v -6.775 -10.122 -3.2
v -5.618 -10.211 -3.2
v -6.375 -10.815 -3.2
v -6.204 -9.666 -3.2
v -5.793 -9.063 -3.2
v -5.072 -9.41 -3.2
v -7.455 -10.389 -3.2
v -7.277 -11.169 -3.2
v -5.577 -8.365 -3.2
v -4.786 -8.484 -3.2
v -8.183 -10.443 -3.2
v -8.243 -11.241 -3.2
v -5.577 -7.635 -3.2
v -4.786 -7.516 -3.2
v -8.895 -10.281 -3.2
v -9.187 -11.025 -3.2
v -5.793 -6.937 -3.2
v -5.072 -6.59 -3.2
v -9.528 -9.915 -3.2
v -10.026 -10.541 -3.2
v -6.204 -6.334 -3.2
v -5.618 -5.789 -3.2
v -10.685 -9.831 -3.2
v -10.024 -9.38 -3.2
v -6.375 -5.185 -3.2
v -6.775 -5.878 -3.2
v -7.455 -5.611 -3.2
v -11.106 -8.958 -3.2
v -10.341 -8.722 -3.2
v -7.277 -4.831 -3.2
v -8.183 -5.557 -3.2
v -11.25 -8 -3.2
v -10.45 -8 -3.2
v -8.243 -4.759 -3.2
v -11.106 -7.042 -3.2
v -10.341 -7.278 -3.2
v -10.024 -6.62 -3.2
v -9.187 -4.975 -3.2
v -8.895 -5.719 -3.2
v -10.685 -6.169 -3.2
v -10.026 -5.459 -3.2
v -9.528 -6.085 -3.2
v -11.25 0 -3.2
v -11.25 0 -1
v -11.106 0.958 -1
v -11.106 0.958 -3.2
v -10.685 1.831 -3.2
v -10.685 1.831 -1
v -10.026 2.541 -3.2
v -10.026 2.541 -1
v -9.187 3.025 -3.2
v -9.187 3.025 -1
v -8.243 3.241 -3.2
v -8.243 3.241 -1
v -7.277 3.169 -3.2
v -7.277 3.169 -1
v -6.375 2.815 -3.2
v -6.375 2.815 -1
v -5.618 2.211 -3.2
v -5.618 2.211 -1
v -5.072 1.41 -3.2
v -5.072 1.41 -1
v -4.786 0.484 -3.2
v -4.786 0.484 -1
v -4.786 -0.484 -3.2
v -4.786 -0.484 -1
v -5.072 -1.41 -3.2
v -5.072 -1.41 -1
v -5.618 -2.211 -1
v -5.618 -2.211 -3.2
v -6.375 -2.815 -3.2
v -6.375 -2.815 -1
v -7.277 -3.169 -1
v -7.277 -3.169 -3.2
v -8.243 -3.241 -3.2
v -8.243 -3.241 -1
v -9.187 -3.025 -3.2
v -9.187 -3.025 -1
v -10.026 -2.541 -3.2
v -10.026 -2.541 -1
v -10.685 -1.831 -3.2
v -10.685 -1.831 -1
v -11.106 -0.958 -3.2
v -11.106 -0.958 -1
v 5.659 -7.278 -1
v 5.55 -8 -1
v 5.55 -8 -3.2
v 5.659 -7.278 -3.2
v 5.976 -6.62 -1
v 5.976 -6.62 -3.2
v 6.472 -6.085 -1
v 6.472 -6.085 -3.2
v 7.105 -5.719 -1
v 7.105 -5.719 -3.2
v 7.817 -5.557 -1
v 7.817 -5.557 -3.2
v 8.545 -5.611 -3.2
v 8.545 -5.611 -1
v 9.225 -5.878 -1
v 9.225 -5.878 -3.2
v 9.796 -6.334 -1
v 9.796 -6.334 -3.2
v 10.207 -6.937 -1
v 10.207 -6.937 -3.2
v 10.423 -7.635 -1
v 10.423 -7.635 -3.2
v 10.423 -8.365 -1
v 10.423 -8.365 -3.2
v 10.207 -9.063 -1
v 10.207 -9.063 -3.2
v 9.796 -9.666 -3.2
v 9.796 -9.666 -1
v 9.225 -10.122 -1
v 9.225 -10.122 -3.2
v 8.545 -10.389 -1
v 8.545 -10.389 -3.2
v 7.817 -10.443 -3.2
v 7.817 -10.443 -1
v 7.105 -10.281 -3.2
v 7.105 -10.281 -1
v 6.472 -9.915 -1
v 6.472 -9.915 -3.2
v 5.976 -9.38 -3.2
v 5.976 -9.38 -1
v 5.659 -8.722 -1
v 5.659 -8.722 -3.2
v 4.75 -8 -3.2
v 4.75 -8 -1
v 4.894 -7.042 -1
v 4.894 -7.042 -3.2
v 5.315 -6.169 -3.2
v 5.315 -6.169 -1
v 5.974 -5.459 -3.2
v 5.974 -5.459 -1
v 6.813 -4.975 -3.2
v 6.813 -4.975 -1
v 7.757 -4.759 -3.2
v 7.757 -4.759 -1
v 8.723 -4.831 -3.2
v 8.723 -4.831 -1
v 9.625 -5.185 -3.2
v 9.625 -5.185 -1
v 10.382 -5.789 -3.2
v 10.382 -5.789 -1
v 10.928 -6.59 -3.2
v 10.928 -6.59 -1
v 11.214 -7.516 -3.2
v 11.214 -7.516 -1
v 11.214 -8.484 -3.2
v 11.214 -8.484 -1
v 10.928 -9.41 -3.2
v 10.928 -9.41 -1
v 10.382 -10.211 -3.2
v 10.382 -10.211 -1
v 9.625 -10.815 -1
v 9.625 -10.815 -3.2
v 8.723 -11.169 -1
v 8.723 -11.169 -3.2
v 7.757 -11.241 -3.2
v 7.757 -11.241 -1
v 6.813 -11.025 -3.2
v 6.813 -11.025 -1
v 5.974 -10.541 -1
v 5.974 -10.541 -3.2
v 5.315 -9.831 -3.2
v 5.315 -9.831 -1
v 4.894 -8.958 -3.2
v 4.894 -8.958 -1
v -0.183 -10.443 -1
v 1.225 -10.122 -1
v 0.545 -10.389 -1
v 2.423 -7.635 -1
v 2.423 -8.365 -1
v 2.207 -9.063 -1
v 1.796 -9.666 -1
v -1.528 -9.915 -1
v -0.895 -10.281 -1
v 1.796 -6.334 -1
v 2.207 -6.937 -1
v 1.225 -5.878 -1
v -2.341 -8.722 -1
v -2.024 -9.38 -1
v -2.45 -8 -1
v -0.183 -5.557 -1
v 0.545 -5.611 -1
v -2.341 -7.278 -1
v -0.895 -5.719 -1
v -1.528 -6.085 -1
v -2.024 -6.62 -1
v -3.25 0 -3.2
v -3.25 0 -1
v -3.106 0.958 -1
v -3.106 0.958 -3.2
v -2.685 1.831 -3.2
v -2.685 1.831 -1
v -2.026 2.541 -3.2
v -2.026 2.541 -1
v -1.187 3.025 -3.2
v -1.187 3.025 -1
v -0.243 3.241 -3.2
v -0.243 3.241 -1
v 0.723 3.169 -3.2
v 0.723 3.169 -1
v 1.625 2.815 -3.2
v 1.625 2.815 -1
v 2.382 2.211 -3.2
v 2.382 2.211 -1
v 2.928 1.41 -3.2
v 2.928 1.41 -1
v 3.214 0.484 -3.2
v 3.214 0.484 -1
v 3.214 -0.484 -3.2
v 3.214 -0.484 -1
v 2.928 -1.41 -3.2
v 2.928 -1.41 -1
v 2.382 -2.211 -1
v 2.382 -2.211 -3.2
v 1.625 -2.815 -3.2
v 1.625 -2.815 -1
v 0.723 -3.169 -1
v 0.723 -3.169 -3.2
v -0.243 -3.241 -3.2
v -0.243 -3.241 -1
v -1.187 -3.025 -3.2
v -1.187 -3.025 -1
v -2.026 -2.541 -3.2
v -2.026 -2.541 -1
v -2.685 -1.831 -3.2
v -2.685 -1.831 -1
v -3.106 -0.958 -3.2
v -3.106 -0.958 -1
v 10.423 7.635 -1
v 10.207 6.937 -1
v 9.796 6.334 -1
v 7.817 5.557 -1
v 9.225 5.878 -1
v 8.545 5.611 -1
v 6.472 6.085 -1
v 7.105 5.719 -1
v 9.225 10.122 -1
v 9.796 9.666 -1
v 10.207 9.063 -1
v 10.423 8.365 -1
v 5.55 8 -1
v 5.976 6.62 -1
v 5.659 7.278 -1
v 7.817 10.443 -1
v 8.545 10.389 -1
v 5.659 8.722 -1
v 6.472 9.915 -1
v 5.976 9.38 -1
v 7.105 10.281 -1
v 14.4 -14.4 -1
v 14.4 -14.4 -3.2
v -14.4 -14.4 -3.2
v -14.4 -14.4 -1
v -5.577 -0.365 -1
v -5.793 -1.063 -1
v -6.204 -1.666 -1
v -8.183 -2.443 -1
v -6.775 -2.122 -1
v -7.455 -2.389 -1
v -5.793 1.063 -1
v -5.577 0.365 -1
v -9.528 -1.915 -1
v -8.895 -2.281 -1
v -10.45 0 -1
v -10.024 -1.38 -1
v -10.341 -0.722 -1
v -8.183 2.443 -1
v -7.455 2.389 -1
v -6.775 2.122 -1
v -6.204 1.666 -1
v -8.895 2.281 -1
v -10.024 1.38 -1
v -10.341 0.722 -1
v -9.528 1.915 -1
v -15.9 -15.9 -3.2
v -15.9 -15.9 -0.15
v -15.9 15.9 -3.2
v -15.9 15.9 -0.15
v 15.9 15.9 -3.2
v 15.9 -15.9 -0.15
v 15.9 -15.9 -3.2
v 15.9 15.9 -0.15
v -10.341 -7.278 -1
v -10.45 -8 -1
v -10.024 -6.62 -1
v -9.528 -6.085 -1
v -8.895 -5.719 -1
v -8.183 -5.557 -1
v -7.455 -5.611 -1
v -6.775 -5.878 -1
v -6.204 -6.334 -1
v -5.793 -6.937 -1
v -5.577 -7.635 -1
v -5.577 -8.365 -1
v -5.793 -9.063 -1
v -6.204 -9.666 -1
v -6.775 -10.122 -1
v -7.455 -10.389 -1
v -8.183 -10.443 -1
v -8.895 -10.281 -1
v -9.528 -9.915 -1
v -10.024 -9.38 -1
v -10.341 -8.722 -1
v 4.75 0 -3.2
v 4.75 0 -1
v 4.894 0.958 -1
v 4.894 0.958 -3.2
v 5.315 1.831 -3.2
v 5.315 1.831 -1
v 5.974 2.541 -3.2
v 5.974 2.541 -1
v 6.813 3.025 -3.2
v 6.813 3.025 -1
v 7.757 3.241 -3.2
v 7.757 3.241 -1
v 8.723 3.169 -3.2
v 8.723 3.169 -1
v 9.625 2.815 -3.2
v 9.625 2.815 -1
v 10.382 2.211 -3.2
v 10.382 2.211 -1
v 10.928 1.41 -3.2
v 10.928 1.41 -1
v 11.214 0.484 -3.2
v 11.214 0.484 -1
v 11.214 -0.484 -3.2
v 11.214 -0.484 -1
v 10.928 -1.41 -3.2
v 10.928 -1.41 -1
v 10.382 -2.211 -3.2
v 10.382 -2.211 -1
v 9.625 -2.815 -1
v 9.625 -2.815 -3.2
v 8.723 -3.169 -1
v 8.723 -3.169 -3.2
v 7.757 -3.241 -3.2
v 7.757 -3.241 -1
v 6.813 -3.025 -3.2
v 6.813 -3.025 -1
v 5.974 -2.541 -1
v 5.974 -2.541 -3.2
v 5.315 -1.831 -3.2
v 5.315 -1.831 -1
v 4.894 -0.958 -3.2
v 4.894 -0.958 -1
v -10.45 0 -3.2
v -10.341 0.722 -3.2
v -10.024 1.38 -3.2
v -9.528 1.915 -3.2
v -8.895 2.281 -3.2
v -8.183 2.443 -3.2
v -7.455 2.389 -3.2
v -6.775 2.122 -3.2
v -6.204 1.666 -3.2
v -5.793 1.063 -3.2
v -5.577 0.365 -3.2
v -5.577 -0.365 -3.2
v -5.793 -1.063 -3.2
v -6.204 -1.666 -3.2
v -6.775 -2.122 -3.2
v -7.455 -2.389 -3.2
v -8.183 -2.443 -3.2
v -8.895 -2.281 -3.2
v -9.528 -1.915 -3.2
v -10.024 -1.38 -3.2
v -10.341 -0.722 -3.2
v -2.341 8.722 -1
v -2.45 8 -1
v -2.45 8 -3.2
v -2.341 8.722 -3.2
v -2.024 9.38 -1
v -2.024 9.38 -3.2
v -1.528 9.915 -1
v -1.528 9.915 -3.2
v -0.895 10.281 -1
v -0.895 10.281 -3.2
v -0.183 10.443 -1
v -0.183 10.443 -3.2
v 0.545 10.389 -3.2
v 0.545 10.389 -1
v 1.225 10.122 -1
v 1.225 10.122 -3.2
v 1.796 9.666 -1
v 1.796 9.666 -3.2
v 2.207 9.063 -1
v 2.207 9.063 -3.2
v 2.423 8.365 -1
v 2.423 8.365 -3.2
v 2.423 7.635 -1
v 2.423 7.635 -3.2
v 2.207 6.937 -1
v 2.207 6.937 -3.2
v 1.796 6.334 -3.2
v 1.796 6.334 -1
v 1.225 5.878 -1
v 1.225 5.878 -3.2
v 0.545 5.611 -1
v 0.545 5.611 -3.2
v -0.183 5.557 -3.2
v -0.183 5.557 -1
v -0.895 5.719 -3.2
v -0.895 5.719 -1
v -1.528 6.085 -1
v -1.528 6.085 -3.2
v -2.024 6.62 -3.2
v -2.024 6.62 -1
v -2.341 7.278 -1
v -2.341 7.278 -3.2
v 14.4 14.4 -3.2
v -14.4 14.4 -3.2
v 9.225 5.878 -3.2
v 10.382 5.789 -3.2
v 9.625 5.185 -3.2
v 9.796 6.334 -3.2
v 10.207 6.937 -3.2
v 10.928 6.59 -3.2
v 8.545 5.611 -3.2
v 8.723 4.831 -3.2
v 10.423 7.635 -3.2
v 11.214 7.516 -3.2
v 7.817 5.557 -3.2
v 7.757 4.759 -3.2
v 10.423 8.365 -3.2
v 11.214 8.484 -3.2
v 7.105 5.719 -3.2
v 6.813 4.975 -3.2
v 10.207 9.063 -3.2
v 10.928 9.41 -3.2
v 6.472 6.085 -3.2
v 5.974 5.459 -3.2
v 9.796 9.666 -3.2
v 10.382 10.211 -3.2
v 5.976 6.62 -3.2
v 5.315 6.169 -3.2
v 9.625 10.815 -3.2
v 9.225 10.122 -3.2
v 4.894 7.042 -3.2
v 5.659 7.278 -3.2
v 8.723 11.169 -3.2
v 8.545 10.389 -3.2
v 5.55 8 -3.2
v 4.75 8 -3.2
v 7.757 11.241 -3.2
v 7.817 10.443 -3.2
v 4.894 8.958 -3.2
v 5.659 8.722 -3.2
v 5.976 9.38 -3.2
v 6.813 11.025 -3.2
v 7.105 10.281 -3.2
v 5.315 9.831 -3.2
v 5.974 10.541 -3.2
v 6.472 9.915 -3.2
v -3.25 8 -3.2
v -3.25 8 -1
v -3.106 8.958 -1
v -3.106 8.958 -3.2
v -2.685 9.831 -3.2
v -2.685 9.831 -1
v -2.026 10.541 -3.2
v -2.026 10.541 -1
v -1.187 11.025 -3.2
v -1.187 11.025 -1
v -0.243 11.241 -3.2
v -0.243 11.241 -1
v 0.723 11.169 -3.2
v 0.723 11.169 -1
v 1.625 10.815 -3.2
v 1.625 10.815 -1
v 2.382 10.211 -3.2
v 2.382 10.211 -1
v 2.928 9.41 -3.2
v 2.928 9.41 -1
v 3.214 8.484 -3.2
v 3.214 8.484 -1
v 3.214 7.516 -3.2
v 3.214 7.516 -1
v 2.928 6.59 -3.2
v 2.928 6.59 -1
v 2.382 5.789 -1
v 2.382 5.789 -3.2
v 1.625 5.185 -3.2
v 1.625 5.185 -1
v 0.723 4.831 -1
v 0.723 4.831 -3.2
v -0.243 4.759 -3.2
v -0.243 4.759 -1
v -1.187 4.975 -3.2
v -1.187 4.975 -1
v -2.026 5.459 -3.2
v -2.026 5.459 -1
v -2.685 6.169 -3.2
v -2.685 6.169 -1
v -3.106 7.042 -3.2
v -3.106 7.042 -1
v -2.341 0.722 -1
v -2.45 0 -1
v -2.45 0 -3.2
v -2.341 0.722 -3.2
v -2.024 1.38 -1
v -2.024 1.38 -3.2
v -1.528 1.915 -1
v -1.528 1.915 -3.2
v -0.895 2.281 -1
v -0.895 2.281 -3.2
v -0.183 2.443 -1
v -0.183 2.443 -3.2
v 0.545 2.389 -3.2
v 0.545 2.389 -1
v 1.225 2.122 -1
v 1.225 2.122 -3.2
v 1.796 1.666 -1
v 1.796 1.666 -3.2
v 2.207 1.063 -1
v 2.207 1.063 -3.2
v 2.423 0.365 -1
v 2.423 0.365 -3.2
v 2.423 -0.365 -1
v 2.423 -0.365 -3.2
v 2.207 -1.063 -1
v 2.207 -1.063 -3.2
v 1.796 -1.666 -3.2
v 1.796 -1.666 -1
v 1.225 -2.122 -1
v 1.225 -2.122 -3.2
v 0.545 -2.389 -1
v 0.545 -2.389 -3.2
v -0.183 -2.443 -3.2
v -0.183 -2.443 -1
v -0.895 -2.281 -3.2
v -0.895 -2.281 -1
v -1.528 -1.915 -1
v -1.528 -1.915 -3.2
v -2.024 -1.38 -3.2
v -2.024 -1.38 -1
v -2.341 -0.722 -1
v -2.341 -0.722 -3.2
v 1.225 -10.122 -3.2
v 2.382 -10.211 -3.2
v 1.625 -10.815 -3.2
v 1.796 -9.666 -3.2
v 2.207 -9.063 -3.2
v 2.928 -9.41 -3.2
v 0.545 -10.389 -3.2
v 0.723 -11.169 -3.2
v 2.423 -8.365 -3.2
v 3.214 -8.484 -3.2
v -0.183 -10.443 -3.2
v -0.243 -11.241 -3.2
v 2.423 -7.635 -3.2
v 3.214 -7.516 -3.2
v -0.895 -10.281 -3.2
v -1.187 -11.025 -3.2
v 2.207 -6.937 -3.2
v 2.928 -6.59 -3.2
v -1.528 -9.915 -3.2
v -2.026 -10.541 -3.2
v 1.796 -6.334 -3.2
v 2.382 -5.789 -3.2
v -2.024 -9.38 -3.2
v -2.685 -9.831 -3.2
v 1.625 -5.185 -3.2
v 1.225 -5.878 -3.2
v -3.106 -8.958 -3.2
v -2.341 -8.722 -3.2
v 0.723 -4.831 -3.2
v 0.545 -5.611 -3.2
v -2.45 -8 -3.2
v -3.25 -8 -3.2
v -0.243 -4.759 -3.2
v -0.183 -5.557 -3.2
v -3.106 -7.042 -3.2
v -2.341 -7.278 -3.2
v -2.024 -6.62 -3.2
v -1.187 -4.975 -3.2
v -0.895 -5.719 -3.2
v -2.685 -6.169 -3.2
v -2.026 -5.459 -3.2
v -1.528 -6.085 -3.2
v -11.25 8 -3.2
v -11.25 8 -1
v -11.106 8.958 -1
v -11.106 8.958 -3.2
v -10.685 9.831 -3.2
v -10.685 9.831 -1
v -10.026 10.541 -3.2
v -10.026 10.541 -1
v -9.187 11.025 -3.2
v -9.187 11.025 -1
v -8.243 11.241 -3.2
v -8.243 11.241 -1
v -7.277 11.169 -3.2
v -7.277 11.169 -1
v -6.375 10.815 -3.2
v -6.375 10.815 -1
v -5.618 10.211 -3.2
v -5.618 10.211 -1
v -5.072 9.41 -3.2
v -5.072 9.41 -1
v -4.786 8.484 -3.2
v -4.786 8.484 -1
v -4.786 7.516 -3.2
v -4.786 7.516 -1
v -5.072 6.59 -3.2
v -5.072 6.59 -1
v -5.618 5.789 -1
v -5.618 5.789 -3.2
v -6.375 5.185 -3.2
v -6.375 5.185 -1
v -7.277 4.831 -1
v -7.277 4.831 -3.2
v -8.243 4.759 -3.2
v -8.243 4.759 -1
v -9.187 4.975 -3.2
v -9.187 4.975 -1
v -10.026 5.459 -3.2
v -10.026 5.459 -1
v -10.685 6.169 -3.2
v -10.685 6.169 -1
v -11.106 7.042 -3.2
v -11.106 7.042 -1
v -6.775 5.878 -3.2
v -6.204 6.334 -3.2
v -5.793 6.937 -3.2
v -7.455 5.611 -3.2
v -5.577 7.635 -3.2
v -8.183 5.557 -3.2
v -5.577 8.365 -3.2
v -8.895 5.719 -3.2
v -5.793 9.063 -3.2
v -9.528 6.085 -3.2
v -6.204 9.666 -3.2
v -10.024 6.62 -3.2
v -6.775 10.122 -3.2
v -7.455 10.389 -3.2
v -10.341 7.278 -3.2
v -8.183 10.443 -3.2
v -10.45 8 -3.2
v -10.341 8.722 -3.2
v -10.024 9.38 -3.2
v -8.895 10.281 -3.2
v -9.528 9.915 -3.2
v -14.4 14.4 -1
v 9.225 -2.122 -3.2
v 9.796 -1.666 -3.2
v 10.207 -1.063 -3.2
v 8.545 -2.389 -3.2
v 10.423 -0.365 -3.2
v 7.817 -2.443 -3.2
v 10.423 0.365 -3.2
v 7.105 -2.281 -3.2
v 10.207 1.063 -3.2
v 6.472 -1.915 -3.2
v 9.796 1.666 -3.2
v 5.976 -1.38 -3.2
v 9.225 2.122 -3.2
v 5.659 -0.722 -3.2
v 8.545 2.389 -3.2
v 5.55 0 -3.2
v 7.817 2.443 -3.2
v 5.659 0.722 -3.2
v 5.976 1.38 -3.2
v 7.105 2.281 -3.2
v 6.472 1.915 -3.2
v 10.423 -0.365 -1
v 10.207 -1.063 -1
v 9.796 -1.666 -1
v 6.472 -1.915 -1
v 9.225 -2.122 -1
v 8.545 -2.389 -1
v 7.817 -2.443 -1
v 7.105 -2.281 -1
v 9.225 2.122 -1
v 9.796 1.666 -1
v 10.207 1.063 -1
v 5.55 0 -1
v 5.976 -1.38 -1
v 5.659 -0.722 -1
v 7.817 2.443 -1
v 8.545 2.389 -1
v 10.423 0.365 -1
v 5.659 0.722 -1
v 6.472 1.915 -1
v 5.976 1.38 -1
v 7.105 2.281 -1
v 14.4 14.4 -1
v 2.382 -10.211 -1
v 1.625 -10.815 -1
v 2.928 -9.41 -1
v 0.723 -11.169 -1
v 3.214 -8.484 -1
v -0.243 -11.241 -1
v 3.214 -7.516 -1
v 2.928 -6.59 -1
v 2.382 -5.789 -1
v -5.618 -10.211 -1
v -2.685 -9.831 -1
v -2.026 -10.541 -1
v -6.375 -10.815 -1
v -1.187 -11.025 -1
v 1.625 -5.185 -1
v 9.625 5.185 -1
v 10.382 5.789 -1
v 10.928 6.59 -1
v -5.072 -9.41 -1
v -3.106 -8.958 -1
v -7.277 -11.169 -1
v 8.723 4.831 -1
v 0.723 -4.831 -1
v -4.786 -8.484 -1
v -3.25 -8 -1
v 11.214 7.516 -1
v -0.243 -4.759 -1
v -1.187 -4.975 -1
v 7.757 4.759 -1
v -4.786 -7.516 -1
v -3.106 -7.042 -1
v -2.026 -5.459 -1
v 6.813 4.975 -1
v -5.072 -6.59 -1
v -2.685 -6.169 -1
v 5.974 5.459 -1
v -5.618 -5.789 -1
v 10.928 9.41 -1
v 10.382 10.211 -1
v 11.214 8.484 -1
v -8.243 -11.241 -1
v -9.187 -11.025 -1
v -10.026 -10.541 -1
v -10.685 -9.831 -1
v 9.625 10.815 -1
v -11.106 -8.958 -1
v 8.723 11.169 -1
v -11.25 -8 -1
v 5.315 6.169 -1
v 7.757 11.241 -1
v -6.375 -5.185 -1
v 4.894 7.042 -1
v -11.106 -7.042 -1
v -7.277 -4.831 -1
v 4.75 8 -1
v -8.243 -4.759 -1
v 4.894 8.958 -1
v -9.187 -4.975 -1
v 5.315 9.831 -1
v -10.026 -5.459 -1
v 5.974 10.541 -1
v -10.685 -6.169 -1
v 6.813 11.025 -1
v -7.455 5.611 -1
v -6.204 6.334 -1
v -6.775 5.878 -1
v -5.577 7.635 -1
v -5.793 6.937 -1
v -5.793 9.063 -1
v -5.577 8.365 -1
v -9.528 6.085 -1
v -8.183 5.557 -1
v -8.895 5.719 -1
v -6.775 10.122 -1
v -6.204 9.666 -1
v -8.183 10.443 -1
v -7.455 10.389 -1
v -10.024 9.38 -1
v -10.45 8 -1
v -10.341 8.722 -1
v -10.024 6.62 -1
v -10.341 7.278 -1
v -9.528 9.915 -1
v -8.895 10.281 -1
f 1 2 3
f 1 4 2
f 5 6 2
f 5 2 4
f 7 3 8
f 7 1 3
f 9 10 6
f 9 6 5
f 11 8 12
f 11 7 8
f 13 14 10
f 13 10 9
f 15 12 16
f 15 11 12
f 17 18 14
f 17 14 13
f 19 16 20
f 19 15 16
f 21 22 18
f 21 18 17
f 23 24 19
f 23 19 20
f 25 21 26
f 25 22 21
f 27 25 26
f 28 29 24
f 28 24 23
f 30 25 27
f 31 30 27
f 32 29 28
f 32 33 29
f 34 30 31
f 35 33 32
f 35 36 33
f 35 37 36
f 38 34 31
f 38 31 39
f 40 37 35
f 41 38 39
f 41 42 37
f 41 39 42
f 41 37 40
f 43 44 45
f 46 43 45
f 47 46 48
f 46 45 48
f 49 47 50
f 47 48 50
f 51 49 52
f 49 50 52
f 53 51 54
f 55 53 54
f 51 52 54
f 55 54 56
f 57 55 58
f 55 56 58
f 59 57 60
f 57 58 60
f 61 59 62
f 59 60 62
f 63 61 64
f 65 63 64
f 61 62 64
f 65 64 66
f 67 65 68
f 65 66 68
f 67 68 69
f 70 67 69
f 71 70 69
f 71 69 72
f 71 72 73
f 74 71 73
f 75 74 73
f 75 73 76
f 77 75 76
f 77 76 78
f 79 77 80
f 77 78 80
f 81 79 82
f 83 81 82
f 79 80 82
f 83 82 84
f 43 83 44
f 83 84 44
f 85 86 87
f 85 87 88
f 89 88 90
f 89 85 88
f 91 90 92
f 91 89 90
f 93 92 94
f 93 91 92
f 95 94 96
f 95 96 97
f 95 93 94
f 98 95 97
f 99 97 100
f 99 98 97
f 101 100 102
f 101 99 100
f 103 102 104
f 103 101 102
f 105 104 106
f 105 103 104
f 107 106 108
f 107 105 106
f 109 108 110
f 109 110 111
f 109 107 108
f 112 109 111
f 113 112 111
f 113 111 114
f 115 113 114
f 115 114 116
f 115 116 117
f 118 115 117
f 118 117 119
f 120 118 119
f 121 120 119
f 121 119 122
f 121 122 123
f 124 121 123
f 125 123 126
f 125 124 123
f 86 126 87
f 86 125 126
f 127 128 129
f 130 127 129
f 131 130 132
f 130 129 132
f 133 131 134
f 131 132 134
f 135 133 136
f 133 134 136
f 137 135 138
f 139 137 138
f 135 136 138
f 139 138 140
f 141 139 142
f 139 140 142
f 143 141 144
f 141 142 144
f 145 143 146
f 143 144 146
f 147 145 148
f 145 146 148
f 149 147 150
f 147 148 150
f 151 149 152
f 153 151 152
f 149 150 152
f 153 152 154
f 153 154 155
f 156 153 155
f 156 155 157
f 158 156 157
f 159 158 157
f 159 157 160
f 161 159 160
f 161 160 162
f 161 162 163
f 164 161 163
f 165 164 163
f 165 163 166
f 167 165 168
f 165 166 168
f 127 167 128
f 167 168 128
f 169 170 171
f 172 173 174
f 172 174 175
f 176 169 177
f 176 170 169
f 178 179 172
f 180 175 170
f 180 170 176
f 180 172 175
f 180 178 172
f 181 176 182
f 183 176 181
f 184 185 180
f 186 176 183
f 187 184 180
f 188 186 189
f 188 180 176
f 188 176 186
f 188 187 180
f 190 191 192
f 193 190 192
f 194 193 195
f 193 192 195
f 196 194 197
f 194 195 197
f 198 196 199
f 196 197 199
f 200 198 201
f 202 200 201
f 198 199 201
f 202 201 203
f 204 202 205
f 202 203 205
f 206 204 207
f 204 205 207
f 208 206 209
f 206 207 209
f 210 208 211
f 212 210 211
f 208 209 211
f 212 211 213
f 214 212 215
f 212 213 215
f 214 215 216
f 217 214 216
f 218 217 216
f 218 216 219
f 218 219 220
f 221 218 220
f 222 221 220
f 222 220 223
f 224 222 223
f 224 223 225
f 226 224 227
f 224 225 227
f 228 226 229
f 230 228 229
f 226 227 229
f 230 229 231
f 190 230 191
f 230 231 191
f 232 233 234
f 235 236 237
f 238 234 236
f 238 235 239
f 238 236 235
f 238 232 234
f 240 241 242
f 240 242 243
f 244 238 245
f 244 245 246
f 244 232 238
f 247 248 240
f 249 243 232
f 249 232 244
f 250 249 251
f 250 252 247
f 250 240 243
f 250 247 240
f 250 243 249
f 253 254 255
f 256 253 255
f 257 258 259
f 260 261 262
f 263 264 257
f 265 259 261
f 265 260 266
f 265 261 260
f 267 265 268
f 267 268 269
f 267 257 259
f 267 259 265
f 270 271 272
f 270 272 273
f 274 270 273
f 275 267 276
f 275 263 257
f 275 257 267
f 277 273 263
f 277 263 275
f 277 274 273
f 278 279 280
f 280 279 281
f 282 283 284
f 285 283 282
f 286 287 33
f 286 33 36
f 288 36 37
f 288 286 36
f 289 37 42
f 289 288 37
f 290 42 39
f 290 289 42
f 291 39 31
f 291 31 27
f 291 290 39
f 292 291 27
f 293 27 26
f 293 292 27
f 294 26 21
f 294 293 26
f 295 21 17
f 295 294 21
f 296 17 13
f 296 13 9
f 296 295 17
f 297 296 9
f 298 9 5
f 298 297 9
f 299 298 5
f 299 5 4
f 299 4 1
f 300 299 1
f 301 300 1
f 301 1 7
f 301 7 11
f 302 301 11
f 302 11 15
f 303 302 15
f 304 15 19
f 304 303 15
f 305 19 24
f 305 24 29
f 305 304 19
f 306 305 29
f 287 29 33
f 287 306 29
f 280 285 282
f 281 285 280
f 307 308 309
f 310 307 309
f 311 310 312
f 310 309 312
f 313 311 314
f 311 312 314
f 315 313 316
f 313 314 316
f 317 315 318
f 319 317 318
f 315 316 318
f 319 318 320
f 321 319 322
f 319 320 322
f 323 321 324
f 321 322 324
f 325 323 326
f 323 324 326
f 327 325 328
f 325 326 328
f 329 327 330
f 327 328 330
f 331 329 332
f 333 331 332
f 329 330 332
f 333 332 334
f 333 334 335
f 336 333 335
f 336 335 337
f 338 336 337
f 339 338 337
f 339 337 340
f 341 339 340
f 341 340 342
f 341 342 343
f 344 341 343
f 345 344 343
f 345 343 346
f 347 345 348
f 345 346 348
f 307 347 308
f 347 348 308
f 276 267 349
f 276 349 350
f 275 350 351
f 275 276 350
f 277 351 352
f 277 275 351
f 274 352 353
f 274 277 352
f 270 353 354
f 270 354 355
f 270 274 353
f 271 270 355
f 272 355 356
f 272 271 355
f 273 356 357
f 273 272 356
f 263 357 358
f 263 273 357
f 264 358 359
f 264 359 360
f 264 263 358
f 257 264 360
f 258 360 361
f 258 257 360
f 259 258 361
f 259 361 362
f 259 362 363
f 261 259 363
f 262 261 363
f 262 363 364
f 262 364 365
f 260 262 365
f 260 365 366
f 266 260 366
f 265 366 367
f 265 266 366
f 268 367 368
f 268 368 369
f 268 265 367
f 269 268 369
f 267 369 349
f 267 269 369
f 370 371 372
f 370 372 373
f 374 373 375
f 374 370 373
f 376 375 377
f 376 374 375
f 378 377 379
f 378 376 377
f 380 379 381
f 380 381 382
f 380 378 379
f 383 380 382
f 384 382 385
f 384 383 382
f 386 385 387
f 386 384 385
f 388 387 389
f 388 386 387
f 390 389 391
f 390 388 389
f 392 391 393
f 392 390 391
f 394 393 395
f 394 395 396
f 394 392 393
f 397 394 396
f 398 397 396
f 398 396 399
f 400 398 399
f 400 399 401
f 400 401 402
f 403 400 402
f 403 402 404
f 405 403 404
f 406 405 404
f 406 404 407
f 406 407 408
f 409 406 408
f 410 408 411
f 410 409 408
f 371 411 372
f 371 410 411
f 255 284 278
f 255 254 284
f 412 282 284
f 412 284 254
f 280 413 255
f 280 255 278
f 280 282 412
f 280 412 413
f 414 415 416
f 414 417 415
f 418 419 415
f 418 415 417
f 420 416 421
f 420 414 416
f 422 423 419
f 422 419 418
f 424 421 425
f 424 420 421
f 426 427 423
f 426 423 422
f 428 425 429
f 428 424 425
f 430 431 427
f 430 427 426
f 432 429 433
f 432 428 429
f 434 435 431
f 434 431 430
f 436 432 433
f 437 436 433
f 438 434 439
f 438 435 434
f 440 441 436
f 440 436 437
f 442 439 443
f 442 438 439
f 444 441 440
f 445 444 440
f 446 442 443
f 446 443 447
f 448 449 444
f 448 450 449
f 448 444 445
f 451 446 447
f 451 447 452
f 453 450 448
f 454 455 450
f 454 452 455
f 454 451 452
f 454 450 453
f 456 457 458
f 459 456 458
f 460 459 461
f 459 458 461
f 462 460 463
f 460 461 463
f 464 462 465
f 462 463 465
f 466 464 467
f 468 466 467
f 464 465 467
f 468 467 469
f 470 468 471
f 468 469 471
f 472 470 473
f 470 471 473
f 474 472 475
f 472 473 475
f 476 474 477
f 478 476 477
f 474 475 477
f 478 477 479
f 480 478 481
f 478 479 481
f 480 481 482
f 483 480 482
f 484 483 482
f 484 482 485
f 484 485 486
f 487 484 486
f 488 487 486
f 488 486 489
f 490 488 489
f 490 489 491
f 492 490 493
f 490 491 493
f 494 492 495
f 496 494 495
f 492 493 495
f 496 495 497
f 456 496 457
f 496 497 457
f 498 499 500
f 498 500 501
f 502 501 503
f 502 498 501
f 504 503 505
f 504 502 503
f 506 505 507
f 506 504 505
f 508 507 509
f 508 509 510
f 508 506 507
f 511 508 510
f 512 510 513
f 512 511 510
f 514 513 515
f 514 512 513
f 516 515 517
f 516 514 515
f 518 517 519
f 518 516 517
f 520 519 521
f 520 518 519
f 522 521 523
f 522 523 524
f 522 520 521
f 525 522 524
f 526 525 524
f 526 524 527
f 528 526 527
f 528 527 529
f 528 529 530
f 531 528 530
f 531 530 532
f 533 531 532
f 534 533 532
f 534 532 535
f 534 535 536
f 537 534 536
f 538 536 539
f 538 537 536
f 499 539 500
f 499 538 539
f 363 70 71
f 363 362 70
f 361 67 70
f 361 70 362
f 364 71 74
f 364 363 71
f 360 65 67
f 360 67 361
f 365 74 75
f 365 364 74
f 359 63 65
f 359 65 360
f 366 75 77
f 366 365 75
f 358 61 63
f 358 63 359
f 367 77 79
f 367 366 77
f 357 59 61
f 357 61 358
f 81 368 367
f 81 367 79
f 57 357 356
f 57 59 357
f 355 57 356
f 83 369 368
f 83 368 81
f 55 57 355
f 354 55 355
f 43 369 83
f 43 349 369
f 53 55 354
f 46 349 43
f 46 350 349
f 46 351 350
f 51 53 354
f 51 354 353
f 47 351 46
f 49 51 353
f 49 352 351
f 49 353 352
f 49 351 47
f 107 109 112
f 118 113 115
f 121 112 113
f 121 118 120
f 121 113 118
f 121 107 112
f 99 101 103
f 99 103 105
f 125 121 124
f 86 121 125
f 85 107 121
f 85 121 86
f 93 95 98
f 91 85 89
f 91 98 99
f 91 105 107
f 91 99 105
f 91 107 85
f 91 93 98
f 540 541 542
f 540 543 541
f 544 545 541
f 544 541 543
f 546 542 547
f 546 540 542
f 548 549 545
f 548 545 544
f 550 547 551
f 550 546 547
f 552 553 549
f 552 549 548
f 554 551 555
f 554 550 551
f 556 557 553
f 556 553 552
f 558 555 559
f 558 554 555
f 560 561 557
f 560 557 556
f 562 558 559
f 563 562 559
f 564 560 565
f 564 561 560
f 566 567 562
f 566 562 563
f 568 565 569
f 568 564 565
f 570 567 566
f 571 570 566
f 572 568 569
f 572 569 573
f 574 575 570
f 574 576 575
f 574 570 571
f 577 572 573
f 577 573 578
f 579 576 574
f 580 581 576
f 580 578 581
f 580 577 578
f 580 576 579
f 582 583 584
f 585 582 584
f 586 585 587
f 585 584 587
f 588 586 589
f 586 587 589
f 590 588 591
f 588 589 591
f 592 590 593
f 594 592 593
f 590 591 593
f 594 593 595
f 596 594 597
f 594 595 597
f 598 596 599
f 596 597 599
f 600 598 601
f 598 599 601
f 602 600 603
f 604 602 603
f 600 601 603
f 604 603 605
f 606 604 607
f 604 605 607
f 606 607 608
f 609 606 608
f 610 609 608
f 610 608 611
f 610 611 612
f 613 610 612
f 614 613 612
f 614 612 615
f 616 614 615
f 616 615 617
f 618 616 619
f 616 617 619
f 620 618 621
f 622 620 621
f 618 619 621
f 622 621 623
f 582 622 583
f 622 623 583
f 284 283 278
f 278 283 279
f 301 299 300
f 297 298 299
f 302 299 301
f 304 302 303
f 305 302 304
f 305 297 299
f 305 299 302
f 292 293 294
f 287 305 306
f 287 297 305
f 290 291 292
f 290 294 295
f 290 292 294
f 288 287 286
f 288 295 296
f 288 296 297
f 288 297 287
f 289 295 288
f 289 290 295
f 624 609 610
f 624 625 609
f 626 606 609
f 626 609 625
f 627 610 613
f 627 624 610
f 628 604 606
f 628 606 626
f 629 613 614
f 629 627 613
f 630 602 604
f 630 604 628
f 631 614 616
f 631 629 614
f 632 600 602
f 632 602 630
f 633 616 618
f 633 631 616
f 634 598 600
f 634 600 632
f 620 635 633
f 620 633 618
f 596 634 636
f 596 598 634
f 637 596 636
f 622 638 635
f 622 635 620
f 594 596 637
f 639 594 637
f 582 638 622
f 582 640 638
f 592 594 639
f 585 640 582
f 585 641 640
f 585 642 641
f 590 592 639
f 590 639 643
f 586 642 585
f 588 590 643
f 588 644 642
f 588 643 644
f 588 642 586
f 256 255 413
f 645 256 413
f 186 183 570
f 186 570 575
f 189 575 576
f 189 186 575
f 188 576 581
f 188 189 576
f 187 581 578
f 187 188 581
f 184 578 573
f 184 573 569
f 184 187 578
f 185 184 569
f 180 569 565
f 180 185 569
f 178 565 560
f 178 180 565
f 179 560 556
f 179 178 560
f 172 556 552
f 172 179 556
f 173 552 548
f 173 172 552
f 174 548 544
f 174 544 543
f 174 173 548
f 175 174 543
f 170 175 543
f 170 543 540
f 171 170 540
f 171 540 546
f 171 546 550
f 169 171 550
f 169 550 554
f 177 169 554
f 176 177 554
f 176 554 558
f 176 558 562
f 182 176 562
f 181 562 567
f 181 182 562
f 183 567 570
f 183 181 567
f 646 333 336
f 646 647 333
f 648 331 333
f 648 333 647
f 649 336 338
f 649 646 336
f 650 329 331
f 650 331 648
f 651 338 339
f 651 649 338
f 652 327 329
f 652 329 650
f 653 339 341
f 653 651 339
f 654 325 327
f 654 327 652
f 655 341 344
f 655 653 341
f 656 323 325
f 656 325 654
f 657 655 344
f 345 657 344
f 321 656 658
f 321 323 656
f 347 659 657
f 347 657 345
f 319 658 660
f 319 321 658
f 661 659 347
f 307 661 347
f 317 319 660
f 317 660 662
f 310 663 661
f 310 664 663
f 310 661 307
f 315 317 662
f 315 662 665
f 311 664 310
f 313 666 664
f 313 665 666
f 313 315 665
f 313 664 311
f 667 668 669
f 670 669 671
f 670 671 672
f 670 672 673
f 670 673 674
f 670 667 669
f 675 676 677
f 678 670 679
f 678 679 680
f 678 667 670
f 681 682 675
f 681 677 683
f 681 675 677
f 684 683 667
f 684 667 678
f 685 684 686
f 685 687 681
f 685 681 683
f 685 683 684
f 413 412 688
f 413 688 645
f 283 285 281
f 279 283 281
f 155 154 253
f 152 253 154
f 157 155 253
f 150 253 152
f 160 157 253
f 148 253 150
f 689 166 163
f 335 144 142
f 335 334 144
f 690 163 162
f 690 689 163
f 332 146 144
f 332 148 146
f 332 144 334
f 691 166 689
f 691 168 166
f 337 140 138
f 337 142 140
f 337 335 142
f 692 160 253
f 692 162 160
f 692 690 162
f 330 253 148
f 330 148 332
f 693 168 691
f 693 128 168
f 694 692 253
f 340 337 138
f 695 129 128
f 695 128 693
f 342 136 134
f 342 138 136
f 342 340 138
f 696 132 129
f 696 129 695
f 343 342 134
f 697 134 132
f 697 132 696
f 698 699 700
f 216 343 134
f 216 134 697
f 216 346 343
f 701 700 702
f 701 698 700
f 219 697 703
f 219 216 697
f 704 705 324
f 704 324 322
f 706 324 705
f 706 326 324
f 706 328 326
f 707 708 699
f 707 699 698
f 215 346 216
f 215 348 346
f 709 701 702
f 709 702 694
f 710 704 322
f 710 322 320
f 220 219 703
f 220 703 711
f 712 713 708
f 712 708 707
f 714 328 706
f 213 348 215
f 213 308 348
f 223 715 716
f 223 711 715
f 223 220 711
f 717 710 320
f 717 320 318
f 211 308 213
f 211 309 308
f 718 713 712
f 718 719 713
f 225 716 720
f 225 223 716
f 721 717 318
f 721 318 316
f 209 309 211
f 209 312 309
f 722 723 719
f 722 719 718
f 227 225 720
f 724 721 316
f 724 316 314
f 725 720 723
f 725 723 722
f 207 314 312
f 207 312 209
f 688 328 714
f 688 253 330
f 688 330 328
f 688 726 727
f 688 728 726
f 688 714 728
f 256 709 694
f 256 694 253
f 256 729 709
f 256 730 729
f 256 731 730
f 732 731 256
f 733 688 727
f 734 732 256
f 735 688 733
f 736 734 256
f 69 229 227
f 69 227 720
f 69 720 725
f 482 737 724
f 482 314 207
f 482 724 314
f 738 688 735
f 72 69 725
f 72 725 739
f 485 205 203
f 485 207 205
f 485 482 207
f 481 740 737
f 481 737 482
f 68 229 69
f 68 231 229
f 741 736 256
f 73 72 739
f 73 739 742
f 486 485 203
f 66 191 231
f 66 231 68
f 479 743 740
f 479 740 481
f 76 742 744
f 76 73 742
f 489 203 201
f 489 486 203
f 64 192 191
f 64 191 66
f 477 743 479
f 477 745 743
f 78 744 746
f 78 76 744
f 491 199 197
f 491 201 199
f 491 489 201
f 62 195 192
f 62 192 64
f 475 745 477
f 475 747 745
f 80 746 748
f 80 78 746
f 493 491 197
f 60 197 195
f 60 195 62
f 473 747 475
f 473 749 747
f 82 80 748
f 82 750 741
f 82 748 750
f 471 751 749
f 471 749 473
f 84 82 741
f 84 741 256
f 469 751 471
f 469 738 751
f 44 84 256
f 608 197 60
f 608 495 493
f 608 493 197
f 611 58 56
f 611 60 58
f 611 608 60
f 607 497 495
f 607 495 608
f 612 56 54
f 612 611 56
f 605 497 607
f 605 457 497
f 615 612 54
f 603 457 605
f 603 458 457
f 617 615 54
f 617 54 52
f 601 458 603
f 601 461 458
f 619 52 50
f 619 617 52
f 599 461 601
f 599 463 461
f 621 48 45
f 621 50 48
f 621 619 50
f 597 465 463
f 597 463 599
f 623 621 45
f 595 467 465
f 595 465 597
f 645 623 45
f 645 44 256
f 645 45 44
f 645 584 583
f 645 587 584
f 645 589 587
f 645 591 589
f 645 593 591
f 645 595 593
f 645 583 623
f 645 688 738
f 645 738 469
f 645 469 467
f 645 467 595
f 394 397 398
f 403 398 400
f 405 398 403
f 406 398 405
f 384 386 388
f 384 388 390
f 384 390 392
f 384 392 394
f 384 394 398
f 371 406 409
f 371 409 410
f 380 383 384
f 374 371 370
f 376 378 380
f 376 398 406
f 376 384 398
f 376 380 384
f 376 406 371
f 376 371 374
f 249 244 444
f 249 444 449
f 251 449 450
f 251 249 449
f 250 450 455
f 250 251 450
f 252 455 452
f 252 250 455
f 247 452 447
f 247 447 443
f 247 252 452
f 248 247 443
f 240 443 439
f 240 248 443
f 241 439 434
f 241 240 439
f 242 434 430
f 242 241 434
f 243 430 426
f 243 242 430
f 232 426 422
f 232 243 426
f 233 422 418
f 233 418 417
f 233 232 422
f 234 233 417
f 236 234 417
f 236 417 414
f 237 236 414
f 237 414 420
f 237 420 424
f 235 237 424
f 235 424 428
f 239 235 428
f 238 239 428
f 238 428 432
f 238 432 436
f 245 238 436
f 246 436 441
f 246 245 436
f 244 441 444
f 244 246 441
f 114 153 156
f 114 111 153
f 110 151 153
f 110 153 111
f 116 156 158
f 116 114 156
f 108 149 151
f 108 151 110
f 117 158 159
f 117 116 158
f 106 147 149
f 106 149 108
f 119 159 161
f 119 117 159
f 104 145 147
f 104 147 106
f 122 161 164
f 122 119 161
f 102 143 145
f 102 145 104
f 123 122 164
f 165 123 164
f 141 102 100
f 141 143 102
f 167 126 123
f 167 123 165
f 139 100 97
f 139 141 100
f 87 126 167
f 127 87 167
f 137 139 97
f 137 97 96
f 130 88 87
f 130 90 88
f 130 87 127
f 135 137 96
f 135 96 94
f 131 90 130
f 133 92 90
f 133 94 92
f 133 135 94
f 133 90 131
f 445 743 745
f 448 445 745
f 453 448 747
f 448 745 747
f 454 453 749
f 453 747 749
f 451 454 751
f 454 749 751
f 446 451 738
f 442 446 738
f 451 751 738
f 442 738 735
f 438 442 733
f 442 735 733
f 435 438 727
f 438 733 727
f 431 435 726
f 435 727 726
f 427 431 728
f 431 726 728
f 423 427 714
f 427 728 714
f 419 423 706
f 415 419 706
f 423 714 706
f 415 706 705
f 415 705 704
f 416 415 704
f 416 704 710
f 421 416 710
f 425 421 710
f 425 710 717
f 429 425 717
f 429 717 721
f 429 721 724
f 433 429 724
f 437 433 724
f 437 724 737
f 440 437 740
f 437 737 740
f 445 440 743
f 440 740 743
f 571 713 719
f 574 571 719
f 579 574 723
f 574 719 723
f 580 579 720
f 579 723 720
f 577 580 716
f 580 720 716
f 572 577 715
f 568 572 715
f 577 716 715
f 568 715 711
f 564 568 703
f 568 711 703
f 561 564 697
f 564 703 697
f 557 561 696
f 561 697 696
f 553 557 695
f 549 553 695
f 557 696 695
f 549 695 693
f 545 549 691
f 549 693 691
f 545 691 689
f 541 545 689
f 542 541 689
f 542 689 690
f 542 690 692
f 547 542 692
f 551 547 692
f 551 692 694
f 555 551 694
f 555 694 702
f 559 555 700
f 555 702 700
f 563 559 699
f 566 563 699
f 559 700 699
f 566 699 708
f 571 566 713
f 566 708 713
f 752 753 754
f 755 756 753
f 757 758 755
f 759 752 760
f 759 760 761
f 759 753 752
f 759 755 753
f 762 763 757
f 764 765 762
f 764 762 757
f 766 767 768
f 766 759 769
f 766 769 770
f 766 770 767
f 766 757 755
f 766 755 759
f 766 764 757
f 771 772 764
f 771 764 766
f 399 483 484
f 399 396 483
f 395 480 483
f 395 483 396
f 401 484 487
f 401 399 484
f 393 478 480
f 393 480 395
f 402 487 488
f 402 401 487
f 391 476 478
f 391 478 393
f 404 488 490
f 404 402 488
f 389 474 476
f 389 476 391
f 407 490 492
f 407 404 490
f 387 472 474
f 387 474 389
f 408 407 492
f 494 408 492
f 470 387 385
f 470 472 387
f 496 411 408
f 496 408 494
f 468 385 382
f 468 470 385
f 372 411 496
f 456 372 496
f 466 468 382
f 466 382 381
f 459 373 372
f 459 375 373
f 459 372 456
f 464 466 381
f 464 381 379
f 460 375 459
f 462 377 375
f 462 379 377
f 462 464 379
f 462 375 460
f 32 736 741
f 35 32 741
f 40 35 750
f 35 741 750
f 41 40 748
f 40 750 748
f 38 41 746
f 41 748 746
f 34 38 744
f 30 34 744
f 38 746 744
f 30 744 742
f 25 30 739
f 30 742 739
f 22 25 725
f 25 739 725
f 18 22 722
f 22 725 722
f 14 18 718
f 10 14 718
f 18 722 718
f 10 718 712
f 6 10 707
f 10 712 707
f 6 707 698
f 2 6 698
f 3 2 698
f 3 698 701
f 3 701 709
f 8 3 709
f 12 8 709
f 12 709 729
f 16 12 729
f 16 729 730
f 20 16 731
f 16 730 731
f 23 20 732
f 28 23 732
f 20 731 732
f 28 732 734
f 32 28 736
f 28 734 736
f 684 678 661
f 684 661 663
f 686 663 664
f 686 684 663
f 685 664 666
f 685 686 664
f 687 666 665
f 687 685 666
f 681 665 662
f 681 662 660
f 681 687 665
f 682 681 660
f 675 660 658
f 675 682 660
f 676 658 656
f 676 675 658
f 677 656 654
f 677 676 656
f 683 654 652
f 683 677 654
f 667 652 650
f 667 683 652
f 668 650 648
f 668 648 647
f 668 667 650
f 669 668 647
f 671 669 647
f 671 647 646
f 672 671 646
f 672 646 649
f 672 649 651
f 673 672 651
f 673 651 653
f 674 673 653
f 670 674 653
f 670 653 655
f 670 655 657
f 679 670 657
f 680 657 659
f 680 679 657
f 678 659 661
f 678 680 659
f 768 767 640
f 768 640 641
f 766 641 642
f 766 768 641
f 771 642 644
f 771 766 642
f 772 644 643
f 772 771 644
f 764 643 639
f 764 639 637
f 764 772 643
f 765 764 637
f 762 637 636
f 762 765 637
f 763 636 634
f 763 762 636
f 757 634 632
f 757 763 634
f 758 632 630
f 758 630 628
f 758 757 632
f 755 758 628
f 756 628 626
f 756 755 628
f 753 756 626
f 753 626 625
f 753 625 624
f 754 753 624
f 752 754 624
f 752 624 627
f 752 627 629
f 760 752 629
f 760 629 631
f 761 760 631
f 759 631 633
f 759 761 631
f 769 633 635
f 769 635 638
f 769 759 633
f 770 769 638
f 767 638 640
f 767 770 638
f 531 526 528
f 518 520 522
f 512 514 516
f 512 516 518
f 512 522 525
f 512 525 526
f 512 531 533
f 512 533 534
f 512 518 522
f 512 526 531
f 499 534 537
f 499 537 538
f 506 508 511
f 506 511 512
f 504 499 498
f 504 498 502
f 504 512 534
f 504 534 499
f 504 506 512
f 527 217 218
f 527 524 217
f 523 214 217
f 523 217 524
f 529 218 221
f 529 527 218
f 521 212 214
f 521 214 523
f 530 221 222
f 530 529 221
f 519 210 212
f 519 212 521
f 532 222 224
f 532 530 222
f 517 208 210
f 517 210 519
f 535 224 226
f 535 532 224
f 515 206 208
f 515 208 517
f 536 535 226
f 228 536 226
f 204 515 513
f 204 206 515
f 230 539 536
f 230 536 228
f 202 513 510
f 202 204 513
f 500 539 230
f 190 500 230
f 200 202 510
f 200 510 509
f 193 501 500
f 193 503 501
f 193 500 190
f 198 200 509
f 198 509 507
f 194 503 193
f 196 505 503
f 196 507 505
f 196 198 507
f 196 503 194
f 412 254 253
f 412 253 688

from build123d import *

# Parameters (mm, degrees)
SKETCH021_W                      = 31.8
SKETCH021_H                      = 31.8
PAD014_DEPTH                     = 3.05
SKETCH022_W                      = 28.8
SKETCH022_H                      = 28.8
POCKET008_DEPTH                  = 2.2
SKETCH023_R                      = 3.25
SKETCH023_R_2                    = 2.45
PAD015_DEPTH                     = 2.2
SKETCH023_LINEARPATTERN002_2_R   = 3.25
SKETCH023_LINEARPATTERN002_2_R_2 = 2.45
PAD015_LINEARPATTERN002_2_DEPTH  = 2.2
SKETCH023_LINEARPATTERN002_3_R   = 3.25
SKETCH023_LINEARPATTERN002_3_R_2 = 2.45
PAD015_LINEARPATTERN002_3_DEPTH  = 2.2
LINEARPATTERN003_COUNT           = 3
LINEARPATTERN003_PITCH           = 8
BODY005_PLACEMENT_ANGLE          = 180


with BuildPart() as part:
    # Sketch021 → Pad014 (new body)
    with BuildSketch(Plane.XY):
        Rectangle(SKETCH021_W, SKETCH021_H)
    extrude(amount=PAD014_DEPTH)

    # Sketch022 (on Face6 of Pad014) → Pocket008 (cut)
    with BuildSketch(Plane.XY.offset(3.05)):
        Rectangle(SKETCH022_W, SKETCH022_H)
    extrude(amount=-POCKET008_DEPTH, mode=Mode.SUBTRACT)

    # Sketch023 (on Face11 of Pocket008) → Pad015 (join)
    with BuildSketch(Plane.XY.offset(0.85)):
        with Locations((8, 8)):
            Circle(SKETCH023_R)
        with Locations((8, 8)):
            Circle(SKETCH023_R_2, mode=Mode.SUBTRACT)
    pad015 = extrude(amount=PAD015_DEPTH)

    # Sketch023 LinearPattern002 2 → Pad015 LinearPattern002 2 (add)
    with BuildSketch(Plane(origin=(-8, 0, 0.85), x_dir=(1, 0, 0), z_dir=(0, 0, 1))):
        with Locations((8, 8)):
            Circle(SKETCH023_LINEARPATTERN002_2_R)
        with Locations((8, 8)):
            Circle(SKETCH023_LINEARPATTERN002_2_R_2, mode=Mode.SUBTRACT)
    pad015_linearpattern002_2 = extrude(amount=PAD015_LINEARPATTERN002_2_DEPTH)

    # Sketch023 LinearPattern002 3 → Pad015 LinearPattern002 3 (add)
    with BuildSketch(Plane(origin=(-16, 0, 0.85), x_dir=(1, 0, 0), z_dir=(0, 0, 1))):
        with Locations((8, 8)):
            Circle(SKETCH023_LINEARPATTERN002_3_R)
        with Locations((8, 8)):
            Circle(SKETCH023_LINEARPATTERN002_3_R_2, mode=Mode.SUBTRACT)
    pad015_linearpattern002_3 = extrude(amount=PAD015_LINEARPATTERN002_3_DEPTH)

    # LinearPattern003: Pad015, Pad015 LinearPattern002 2, Pad015 LinearPattern002 3 ×3
    with Locations(*[(0, -i * LINEARPATTERN003_PITCH, 0) for i in range(1, LINEARPATTERN003_COUNT)]):
        add(pad015)
        add(pad015_linearpattern002_2)
        add(pad015_linearpattern002_3)


with BuildPart() as part_1:
    # Body005 placement: moved
    add(part.part.moved(Location((0, 0, -0.15))).rotate(Axis((0, 0, -0.15), (0, 1, 0)), BODY005_PLACEMENT_ANGLE))


solid = part_1.part
